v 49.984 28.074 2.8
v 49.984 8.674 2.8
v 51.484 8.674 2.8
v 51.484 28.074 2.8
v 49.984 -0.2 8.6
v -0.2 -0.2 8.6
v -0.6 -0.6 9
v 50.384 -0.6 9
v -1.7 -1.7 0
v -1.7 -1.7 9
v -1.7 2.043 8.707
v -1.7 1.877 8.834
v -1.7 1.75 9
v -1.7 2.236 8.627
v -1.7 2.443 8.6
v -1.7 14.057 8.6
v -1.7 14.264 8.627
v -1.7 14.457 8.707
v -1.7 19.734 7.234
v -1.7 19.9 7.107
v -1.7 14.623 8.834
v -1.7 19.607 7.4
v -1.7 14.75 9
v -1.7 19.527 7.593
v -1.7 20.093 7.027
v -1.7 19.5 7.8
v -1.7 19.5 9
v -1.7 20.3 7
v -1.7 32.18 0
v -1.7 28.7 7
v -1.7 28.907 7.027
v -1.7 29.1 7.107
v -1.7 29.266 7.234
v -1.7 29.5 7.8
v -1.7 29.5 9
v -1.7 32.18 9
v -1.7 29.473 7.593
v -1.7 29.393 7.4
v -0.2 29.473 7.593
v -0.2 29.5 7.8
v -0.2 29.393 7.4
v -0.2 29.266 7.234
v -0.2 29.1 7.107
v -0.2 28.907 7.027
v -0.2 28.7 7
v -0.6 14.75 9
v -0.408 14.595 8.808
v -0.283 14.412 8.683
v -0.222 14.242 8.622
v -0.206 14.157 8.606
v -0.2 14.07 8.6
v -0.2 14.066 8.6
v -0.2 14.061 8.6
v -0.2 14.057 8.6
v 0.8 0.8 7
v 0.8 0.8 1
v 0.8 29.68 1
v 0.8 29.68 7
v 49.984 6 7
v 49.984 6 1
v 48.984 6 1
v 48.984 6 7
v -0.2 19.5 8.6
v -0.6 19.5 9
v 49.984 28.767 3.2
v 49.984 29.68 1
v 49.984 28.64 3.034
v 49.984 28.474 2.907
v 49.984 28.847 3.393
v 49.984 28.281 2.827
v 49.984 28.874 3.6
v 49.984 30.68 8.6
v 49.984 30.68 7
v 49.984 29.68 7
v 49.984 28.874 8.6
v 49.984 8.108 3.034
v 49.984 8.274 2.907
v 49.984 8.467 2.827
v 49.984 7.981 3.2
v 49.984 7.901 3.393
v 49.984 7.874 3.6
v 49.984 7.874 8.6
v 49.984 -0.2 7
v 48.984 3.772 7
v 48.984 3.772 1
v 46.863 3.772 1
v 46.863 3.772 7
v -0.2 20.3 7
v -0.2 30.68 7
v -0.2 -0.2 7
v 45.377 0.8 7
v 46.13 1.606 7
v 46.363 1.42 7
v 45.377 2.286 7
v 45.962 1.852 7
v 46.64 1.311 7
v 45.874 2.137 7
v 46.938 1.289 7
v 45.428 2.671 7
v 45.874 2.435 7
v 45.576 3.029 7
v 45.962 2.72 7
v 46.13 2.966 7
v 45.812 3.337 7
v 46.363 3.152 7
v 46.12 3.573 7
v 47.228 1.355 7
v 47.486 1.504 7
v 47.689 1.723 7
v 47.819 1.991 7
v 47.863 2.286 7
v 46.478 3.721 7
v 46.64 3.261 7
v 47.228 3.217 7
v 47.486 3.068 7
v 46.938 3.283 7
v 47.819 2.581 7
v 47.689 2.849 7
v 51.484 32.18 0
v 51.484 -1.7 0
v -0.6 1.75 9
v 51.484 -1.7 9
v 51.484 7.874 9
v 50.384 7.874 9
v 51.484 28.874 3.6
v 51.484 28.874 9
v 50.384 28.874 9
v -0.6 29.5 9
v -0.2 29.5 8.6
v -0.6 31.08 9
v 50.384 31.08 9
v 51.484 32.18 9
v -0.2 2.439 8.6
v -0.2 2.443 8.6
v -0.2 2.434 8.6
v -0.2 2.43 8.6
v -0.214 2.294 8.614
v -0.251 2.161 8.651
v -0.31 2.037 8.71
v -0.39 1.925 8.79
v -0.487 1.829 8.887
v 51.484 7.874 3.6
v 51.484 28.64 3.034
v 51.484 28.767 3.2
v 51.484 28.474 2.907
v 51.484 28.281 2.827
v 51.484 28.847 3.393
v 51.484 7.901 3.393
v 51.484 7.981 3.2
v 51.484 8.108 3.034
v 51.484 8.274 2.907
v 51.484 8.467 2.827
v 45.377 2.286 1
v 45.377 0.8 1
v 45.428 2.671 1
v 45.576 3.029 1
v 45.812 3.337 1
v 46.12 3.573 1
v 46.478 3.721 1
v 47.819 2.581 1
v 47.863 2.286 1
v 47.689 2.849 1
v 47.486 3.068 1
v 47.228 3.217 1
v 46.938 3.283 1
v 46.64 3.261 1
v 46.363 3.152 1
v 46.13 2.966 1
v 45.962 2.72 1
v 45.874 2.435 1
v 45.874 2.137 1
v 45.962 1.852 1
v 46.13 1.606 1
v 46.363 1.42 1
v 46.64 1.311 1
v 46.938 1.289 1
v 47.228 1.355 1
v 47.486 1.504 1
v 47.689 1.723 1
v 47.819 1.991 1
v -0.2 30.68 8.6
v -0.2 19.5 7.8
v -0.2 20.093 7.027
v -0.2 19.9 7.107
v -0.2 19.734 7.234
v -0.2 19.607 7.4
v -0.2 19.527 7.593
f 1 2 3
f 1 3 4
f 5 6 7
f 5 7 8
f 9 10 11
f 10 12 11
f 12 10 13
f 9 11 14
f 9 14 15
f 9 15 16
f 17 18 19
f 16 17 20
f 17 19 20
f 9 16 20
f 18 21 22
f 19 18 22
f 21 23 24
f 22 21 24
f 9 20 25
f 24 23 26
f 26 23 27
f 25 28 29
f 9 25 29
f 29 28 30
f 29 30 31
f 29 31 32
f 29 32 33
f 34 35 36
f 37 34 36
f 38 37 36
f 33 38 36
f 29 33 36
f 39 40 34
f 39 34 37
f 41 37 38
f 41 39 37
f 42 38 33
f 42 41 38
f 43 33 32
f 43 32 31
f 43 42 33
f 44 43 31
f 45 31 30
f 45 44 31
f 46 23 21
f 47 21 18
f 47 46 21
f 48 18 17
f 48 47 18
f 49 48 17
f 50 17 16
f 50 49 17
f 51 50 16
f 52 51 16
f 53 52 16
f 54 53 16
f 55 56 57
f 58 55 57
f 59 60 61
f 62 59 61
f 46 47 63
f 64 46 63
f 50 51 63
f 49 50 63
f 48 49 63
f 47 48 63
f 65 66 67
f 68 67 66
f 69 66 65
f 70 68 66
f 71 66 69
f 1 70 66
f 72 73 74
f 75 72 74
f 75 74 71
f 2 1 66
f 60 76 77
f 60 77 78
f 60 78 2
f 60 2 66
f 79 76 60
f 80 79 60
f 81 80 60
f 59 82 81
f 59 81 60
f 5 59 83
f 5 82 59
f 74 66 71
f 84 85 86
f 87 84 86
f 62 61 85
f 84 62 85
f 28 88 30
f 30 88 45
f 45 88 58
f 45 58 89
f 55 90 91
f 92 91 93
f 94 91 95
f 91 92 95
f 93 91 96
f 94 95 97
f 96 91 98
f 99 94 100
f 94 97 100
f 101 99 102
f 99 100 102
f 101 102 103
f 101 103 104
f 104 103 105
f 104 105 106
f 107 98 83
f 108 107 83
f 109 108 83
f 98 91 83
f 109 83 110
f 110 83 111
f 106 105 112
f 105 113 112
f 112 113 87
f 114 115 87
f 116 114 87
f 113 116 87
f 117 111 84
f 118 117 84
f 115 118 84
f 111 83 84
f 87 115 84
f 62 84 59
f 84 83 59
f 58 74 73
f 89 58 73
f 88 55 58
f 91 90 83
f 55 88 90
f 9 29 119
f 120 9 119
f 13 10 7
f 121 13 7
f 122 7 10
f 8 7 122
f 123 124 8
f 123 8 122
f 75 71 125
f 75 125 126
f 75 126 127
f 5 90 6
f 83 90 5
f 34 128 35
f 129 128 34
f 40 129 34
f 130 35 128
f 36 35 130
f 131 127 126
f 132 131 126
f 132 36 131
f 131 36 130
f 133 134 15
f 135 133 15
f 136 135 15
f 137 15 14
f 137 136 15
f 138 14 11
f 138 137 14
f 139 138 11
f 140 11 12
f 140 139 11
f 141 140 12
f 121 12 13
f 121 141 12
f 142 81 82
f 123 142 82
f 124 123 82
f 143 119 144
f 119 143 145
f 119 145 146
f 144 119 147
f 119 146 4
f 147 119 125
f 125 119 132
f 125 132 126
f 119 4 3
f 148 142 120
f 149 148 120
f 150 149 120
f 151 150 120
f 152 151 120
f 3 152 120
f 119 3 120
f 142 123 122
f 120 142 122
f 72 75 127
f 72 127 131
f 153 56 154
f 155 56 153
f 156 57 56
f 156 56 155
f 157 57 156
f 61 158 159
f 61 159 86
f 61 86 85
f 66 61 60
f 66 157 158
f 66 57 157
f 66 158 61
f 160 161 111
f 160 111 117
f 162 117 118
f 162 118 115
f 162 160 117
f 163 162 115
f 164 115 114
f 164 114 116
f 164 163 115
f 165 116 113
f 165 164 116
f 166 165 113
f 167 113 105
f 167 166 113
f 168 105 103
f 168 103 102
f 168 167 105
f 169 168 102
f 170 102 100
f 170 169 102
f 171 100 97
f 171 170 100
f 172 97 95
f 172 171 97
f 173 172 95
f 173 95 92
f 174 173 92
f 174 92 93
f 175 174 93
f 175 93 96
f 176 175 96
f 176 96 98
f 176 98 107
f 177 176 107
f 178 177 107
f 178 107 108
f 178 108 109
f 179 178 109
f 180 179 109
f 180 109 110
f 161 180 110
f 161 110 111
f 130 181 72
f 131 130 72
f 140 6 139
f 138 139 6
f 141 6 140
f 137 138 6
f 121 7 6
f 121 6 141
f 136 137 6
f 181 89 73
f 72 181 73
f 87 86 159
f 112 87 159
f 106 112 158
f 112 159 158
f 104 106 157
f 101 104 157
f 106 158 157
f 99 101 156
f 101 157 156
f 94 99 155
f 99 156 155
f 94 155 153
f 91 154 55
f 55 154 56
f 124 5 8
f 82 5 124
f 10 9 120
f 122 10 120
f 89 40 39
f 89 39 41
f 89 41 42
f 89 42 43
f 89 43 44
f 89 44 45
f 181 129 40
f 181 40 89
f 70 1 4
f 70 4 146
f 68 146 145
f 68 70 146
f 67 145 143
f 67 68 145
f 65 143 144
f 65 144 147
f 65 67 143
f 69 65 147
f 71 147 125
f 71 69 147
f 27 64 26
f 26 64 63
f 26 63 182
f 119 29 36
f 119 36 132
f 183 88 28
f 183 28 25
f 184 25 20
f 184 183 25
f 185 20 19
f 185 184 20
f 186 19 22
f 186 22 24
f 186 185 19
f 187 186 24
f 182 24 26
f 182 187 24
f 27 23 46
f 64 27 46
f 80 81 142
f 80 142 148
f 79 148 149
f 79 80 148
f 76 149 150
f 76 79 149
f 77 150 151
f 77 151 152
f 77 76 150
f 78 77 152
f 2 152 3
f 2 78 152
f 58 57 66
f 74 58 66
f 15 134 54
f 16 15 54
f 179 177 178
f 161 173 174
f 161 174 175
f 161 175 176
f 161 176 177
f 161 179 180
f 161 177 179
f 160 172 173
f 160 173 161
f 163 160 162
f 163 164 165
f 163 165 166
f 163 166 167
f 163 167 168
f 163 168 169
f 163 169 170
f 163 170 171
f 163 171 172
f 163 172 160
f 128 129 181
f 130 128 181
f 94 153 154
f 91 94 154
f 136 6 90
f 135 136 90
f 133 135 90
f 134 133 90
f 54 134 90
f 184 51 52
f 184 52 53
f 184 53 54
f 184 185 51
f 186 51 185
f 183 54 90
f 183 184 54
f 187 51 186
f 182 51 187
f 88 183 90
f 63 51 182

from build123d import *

# Parameters (mm, degrees)
EXTRUDE_1_DEPTH     = 1
SKETCH_1_R          = 1
EXTRUDE_1_2_DEPTH   = 1
SKETCH_1_3_R        = 1.486
SKETCH_1_3_R_2      = 1
EXTRUDE_2_DEPTH     = 7
SKETCH_1_4_W        = 53.184
SKETCH_1_4_H        = 33.88
SKETCH_1_4_W_2      = 50.184
SKETCH_1_4_H_2      = 30.88
EXTRUDE_3_DEPTH     = 9
SKETCH_2_W          = 6.2
SKETCH_2_H          = 21
CUT_EXTRUDE_1_DEPTH = 62.545010001
SKETCH_3_W          = 2
SKETCH_3_H          = 10
CUT_EXTRUDE_2_DEPTH = 62.545010001
SKETCH_4_W          = 0.4
SKETCH_4_H          = 13
CUT_EXTRUDE_3_DEPTH = 62.545010001
FILLET_1_R          = 0.8
CHAMFER_1_SIZE      = 0.4


# Some blends are built 0.0001 mm under size
with BuildPart() as part:
    # Эскиз1 → Бобышка-Вытянуть1 (new body)
    with BuildSketch(Plane.XY):
        with BuildLine():
            Line((48.984, 3.772), (48.984, 6))
            Line((48.984, 6), (49.984, 6))
            Line((49.984, 6), (49.984, 29.68))
            Line((49.984, 29.68), (0.8, 29.68))
            Line((0.8, 29.68), (0.8, 0.8))
            Line((0.8, 0.8), (45.377, 0.8))
            Line((45.377, 0.8), (45.377, 2.286))
            ThreePointArc((45.377, 2.286), (45.812239323, 3.336760677), (46.863, 3.772))
            Line((46.863, 3.772), (48.984, 3.772))
        make_face()
    extrude(amount=EXTRUDE_1_DEPTH)



with BuildPart() as body_2:
    # Эскиз1 → Extrude 1 2 (new body)
    with BuildSketch(Plane.XY):
        with Locations((46.863, 2.286)):
            Circle(SKETCH_1_R)
    extrude(amount=EXTRUDE_1_2_DEPTH)


with BuildPart() as part_1:
    add(part.part)

    add(body_2.part)  # Бобышка-Вытянуть2 merges body 2
    # Эскиз1<3> → Бобышка-Вытянуть2 (add)
    # profile 1 of 4: a face of its own
    with BuildSketch(Plane.XY):
        Polygon((0.8, 29.68), (48.984, 29.68), (49.984, 29.68), (49.984, 30.68), (-0.2, 30.68), (-0.2, -0.2), (49.984, -0.2), (49.984, 6), (48.984, 6), (48.984, 3.772), (48.984, 0.8), (46.863, 0.8), (45.377, 0.8), (0.8, 0.8), align=None)
    # profile 2 of 4: a face of its own
    with BuildSketch(Plane.XY):
        with BuildLine():
            Line((48.984, 0.8), (48.984, 3.772))
            Line((48.984, 3.772), (46.863, 3.772))
            ThreePointArc((46.863, 3.772), (47.913760677, 3.336760677), (48.349, 2.286))
            ThreePointArc((48.349, 2.286), (47.913760677, 1.235239323), (46.863, 0.8))
            Line((46.863, 0.8), (48.984, 0.8))
        make_face()
    # profile 3 of 4: a face of its own
    with BuildSketch(Plane.XY):
        with BuildLine():
            Line((45.377, 2.286), (45.377, 0.8))
            Line((45.377, 0.8), (46.863, 0.8))
            ThreePointArc((46.863, 0.8), (45.812239323, 1.235239323), (45.377, 2.286))
        make_face()
    # profile 4 of 4: a face of its own
    with BuildSketch(Plane.XY):
        with Locations((46.863, 2.286)):
            Circle(SKETCH_1_3_R)
        with Locations((46.863, 2.286)):
            Circle(SKETCH_1_3_R_2, mode=Mode.SUBTRACT)
    extrude(amount=EXTRUDE_2_DEPTH)

    # Эскиз1<4> → Бобышка-Вытянуть3 (add)
    with BuildSketch(Plane.XY):
        with Locations((24.892, 15.24)):
            Rectangle(SKETCH_1_4_W, SKETCH_1_4_H)
        with Locations((24.892, 15.24)):
            Rectangle(SKETCH_1_4_W_2, SKETCH_1_4_H_2, mode=Mode.SUBTRACT)
    extrude(amount=EXTRUDE_3_DEPTH)

    # Эскиз2 → Вырез-Вытянуть1 (cut, through all)
    with BuildSketch(Plane.ZY.offset(-49.984)):
        with Locations((5.9, 18.374)):
            Rectangle(SKETCH_2_W, SKETCH_2_H)
    extrude(amount=-CUT_EXTRUDE_1_DEPTH, mode=Mode.SUBTRACT)

    # Эскиз3 → Вырез-Вытянуть2 (cut, through all)
    with BuildSketch(Plane(origin=(-0.2, 0, 0), x_dir=(0, 0, -1), z_dir=(1, 0, 0))):
        with Locations((-8, 24.5)):
            Rectangle(SKETCH_3_W, SKETCH_3_H)
    extrude(amount=-CUT_EXTRUDE_2_DEPTH, mode=Mode.SUBTRACT)

    # Эскиз4 → Вырез-Вытянуть3 (cut, through all)
    with BuildSketch(Plane(origin=(-0.2, 0, 0), x_dir=(0, 0, -1), z_dir=(1, 0, 0))):
        with Locations((-8.8, 8.25)):
            Rectangle(SKETCH_4_W, SKETCH_4_H)
    extrude(amount=-CUT_EXTRUDE_3_DEPTH, mode=Mode.SUBTRACT)

    # Скругление1
    # the kernel refuses this fillet: 0.8 mm, written as the material it adds along each edge
    with BuildSketch(Plane(origin=(49.984, 7.874, 2.8), x_dir=(0, 1, 0), z_dir=(1, 0, 0)), Plane(origin=(49.984, 28.874, 2.8), x_dir=(0, 0, 1), z_dir=(1, 0, 0)), Plane(origin=(-0.2, 19.5, 7), x_dir=(0, 0, 1), z_dir=(-1, 0, 0)), Plane(origin=(-0.2, 29.5, 7), x_dir=(0, -1, 0), z_dir=(-1, 0, 0))) as fillet_1_piece_1:
        with BuildLine():
            CenterArc((FILLET_1_R, FILLET_1_R), FILLET_1_R, 180, 90)
            Line((0, FILLET_1_R), (-FILLET_1_R * 0.02, FILLET_1_R))
            Line((-FILLET_1_R * 0.02, FILLET_1_R), (-FILLET_1_R * 0.02, -FILLET_1_R * 0.02))
            Line((-FILLET_1_R * 0.02, -FILLET_1_R * 0.02), (FILLET_1_R, -FILLET_1_R * 0.02))
            Line((FILLET_1_R, -FILLET_1_R * 0.02), (FILLET_1_R, 0))
        make_face()
    extrude(amount=1.5)
    with BuildSketch(Plane(origin=(-0.2, 1.75, 8.6), x_dir=(0, 0, 1), z_dir=(-1, 0, 0))) as fillet_1_piece_2:
        with BuildLine():
            CenterArc((0.8, 0.692820323), FILLET_1_R, 180, 60)
            Line((0, 0.692820323), (-0.016, 0.692820323))
            Line((-0.016, 0.692820323), (-0.016, 0))
            Line((-0.016, 0), (0, -0.016))
            ThreePointArc((0, -0.016), (0.2, -0.016), (0.392, -0.013856406))
            Line((0.392, -0.013856406), (0.4, 0))
        make_face()
    extrude(amount=1.5)
    with BuildSketch(Plane(origin=(-0.2, 14.75, 8.6), x_dir=(0, -1, 0), z_dir=(-1, 0, 0))) as fillet_1_piece_3:
        with BuildLine():
            CenterArc((0.692820323, 0.8), FILLET_1_R, 210, 60)
            Line((0, 0.4), (-0.013856406, 0.392))
            ThreePointArc((-0.013856406, 0.392), (-0.016, 0.2), (-0.016, 0))
            Line((-0.016, 0), (0, -0.016))
            Line((0, -0.016), (0.692820323, -0.016))
            Line((0.692820323, -0.016), (0.692820323, 0))
        make_face()
    extrude(amount=1.5)

    # Фаска1
    chamfer_1_edges = [part_1.edges().sort_by_distance(p)[0] for p in [
        (-0.2, 17.125, 9),
        (-0.2, 0.775, 9),
        (24.892, -0.2, 9),
        (49.984, 3.837, 9),
        (49.984, 29.777, 9),
        (24.892, 30.68, 9),
        (-0.2, 30.09, 9),
    ]]
    chamfer(chamfer_1_edges, length=CHAMFER_1_SIZE - 0.0001)  # a hair under: the kernel refuses the full size


solid = part_1.part
